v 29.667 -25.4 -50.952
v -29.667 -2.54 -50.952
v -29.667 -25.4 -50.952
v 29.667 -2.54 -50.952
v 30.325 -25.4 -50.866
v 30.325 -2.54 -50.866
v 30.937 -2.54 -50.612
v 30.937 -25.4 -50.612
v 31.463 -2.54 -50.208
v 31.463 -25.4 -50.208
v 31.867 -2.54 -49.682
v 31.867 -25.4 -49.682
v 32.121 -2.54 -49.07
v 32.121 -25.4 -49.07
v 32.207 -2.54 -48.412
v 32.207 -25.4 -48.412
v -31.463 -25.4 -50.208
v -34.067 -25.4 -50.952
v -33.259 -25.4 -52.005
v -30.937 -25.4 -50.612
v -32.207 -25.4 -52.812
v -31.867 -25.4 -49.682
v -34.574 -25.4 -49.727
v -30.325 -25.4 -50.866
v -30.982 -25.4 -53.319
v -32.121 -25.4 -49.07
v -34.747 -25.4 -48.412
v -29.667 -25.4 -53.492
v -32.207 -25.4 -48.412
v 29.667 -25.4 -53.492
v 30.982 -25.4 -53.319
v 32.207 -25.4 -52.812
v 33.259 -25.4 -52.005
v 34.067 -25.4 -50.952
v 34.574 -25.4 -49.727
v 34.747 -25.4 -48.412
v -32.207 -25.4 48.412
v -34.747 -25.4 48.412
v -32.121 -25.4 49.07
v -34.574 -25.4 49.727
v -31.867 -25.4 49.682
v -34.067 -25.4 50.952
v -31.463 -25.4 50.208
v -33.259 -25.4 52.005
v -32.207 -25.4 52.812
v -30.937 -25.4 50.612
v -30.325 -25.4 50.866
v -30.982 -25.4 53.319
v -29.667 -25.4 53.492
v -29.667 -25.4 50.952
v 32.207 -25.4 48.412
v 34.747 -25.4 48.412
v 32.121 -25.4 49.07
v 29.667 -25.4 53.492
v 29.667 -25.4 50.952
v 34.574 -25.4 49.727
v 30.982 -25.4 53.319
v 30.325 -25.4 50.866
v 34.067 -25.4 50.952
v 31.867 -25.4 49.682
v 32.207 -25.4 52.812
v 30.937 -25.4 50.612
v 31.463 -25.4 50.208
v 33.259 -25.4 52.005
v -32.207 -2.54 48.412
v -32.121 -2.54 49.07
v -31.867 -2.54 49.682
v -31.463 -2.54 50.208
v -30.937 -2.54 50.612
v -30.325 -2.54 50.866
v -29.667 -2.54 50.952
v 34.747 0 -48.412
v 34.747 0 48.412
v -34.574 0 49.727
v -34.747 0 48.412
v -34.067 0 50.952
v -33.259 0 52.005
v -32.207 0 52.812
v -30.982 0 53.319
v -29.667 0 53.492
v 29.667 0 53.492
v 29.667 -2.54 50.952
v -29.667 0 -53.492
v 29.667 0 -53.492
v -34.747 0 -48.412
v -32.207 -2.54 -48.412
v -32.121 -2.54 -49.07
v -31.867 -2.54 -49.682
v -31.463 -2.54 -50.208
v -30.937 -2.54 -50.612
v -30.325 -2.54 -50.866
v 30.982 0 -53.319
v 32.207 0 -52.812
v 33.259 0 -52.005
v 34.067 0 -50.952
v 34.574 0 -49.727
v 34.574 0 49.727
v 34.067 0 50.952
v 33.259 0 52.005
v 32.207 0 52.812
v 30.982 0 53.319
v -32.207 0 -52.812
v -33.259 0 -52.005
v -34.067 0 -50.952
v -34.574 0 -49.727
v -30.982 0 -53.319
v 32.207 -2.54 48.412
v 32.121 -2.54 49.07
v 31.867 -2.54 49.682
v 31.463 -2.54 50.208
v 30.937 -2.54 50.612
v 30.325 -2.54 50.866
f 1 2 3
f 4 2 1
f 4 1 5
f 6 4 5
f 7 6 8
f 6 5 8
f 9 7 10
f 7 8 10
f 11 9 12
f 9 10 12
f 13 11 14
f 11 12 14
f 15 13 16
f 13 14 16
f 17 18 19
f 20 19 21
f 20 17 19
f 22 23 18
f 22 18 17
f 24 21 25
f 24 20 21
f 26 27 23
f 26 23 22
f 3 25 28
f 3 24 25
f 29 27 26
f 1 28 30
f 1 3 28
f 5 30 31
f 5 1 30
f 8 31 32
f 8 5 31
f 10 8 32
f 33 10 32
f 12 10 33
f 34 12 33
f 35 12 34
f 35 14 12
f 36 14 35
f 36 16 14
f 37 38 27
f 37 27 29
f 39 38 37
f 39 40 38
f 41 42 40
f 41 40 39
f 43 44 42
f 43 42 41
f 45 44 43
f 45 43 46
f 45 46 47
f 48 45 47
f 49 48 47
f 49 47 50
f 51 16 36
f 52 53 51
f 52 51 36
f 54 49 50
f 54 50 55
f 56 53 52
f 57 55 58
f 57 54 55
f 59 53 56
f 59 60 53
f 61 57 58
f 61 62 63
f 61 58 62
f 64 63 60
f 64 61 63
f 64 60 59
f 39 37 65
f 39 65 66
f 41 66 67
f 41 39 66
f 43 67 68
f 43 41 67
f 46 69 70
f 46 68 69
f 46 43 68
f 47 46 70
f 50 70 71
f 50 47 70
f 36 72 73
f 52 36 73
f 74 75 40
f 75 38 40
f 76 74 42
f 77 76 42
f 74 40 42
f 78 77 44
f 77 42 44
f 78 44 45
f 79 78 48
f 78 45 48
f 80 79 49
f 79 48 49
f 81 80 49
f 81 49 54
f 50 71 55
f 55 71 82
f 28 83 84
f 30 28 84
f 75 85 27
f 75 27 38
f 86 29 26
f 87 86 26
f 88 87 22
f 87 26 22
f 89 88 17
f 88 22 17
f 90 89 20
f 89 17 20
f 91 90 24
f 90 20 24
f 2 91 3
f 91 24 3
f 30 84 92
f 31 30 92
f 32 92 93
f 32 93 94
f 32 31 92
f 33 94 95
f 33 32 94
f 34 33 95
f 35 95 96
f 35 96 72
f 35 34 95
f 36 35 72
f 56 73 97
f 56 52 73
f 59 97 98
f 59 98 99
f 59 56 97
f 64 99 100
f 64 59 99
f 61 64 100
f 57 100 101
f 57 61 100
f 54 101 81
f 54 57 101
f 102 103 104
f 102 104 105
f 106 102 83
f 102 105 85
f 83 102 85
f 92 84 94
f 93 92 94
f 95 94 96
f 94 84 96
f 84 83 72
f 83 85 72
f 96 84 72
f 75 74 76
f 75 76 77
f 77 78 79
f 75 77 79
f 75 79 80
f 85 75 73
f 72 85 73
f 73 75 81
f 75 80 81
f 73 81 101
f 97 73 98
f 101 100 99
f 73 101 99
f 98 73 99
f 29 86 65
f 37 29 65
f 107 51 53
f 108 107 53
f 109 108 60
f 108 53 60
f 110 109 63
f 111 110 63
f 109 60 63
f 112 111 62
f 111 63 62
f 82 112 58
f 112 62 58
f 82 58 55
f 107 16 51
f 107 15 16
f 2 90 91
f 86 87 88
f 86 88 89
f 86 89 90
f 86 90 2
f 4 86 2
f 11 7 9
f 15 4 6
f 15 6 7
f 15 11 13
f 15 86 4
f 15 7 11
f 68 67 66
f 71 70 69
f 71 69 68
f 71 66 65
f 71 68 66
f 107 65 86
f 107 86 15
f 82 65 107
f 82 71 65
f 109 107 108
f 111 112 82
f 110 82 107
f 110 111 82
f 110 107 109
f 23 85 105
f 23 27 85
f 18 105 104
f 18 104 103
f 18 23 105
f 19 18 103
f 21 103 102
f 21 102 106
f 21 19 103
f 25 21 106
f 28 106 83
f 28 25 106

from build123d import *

# Parameters (mm, degrees)
F0_W     = 69.494404
F0_H     = 106.984802
F1_DEPTH = 25.4
F2_R     = 5.08
F3_T     = -2.54


with BuildPart() as f1:
    # F0 (on Front) → F1 (new body)
    with BuildSketch(Plane.XZ):
        Rectangle(F0_W, F0_H)
    extrude(amount=F1_DEPTH)

    # F2
    f2_edges = [f1.edges().sort_by_distance(p)[0] for p in [
        (-34.747202, -12.7, 53.492401),
        (-34.747202, -12.7, -53.492401),
        (34.747202, -12.7, 53.492401),
        (34.747202, -12.7, -53.492401),
    ]]
    fillet(f2_edges, radius=F2_R)

    # F3
    f3_openings = [f1.faces().sort_by_distance(p)[0] for p in [
        (0, -25.4, 0),
    ]]
    offset(amount=F3_T, openings=f3_openings)


solid = f1.part
